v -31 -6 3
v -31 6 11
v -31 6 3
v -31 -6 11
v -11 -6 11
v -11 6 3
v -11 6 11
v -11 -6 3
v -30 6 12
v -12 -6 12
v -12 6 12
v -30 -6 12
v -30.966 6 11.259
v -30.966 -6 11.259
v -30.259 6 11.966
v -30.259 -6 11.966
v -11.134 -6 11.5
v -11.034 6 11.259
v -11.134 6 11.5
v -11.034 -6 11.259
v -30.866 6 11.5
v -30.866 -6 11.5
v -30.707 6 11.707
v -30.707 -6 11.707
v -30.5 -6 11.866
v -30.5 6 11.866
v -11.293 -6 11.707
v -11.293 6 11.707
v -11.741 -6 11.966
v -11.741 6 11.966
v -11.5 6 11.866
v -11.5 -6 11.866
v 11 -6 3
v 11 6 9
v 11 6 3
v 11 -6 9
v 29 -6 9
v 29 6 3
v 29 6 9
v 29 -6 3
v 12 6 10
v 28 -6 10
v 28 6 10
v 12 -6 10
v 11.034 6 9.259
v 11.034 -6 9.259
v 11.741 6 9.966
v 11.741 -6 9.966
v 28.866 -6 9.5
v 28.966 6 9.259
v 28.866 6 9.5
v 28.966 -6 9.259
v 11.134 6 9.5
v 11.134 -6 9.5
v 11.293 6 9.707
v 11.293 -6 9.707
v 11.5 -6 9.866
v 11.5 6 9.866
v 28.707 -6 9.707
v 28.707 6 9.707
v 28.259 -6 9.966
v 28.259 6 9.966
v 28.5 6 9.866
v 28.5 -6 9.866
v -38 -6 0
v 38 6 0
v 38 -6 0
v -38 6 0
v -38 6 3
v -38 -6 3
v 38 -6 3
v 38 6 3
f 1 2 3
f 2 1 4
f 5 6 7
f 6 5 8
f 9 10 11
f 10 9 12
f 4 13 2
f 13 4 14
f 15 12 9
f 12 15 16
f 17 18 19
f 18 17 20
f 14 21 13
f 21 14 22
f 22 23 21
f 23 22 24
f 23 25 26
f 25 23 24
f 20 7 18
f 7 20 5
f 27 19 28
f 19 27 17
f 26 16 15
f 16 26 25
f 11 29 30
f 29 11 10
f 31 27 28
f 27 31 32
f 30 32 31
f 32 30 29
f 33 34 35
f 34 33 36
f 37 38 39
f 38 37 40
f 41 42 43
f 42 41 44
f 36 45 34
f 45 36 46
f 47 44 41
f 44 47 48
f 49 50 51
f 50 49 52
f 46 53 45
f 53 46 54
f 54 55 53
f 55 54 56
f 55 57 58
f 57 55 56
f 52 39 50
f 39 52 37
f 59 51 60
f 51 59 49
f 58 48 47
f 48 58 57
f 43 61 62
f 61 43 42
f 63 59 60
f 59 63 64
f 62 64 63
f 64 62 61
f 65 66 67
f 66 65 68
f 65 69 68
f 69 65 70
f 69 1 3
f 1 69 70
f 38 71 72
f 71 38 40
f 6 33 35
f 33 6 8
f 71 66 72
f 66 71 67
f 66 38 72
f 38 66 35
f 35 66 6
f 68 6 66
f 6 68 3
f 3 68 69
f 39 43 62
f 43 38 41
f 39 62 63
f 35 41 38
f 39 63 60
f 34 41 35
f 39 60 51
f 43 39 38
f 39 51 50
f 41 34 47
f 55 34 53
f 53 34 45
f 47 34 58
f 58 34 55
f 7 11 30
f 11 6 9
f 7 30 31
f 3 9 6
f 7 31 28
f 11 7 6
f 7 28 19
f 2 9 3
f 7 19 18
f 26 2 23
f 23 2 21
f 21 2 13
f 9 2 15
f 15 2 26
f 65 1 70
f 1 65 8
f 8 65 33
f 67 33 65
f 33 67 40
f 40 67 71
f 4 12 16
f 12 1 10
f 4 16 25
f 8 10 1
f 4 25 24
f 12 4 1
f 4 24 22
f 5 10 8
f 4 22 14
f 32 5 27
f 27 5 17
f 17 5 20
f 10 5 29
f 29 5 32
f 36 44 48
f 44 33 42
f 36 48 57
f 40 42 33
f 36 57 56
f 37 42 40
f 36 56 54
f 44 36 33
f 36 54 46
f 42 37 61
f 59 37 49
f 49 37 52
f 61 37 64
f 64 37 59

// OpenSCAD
// file: lift-off-hinge-taping-rests.scad
// One loose fixed-profile rest; print TWO identical rests separately.
// Millimeters. These elevations and contact sizes are UNMEASURED EXAMPLES.
// x crosses the seam, y follows it, z=0 is the flat bench/print-bed plane.
part = "rest"; // "rest" or "contact_coupon"

base_width = 76;
base_length = 50;
base_thickness = 3;
minimum_floor_thickness = 2; // Geometric floor guard, not a strength rating.
base_edge_radius = 2;
left_land_width = 20;
right_land_width = 18;
left_land_length = 44;
right_land_length = 40;
left_land_elevation = 12;  // Absolute upper contact plane above the bench.
right_land_elevation = 10;
seam_relief_width = 22;   // Clear distance between the two land envelopes.
contact_edge_radius = 1;
placement_margin = 3;    // Minimum base margin outside each land envelope.
tape_access_width = 16;  // Declared centered access envelope, not hinge gap.
tape_access_clearance = 2; // Lateral clearance on each side of that envelope.
access_height = 5;       // Declared clear height above floor to lower land top.
coupon_length = 12;      // Short y slice through exactly the same rest source.

// Fixed modest tessellation preserves cardinal extrema and broad flat tops.
$fn = 24;

assert(part == "rest" || part == "contact_coupon",
       "Part must be rest or contact_coupon.");
assert(base_width > 0 && base_length > 0 && base_thickness > 0,
       "Base dimensions must be positive.");
assert(minimum_floor_thickness > 0 && base_thickness >= minimum_floor_thickness,
       "Base must retain the positive minimum floor thickness.");
assert(left_land_width > 0 && right_land_width > 0 &&
       left_land_length > 0 && right_land_length > 0,
       "Land dimensions must be positive.");
assert(contact_edge_radius > 0 && base_edge_radius > 0,
       "Edge radii must be positive.");
assert(2 * base_edge_radius < min(base_width, base_length),
       "Base rounding must leave straight base edges.");
assert(2 * contact_edge_radius < min(left_land_width, right_land_width,
                                   left_land_length, right_land_length),
       "Contact rounding must leave broad flat land tops.");
assert(base_thickness > contact_edge_radius,
       "Contact rounding must join each land above the base underside.");
assert(left_land_elevation >= base_thickness + 2 * contact_edge_radius &&
       right_land_elevation >= base_thickness + 2 * contact_edge_radius,
       "Land elevations must retain rounded support above the floor.");
assert(seam_relief_width > 0 && placement_margin > 0,
       "Seam relief and placement margin must be positive.");
assert(placement_margin >= base_edge_radius,
       "Placement margin must cover the rounded base corners.");
assert(seam_relief_width / 2 + left_land_width + placement_margin <= base_width / 2 &&
       seam_relief_width / 2 + right_land_width + placement_margin <= base_width / 2 &&
       max(left_land_length, right_land_length) + 2 * placement_margin <= base_length,
       "Each land must fit inside the base placement margins.");
assert(tape_access_width > 0 && tape_access_clearance > 0 && access_height > 0,
       "Tape access dimensions and clearance must be positive.");
assert(seam_relief_width >= tape_access_width + 2 * tape_access_clearance,
       "Seam relief must clear the centered tape access envelope.");
assert(min(left_land_elevation, right_land_elevation) - base_thickness >= access_height,
       "Land elevations must clear the declared access height above the floor.");
assert(coupon_length > 2 * contact_edge_radius &&
       coupon_length < min(left_land_length, right_land_length) - 2 * contact_edge_radius,
       "Coupon length must retain a short central contact cross-section.");

module rounded_base() {
    linear_extrude(height = base_thickness)
        rounded_rectangle(base_width, base_length, base_edge_radius);
}

module rounded_rectangle(width, height, radius) {
    offset(r = radius)
        square([width - 2 * radius, height - 2 * radius], center = true);
}

// Three rounded 2D extrusions soften all contact edges, including y ends.
// Their planar tops retain the exact elevation instead of a sphere's faceted
// polar approximation. The lower edge overlaps the base by one radius.
module bearing_land(x_min, width, length, elevation) {
    r = contact_edge_radius;
    bottom = base_thickness - r;
    height = elevation - bottom;
    translate([x_min + width / 2, 0, bottom + height / 2])
        intersection() {
            linear_extrude(height = height, center = true)
                rounded_rectangle(width, length, r);
            rotate([90, 0, 0])
                linear_extrude(height = length, center = true)
                    rounded_rectangle(width, height, r);
            rotate([90, 0, 90])
                linear_extrude(height = width, center = true)
                    rounded_rectangle(length, height, r);
        }
}

module rest() {
    union() {
        rounded_base();
        bearing_land(-seam_relief_width / 2 - left_land_width,
                     left_land_width, left_land_length, left_land_elevation);
        bearing_land(seam_relief_width / 2,
                     right_land_width, right_land_length, right_land_elevation);
    }
}

if (part == "rest") {
    rest();
} else {
    // Intersect the same complete solid; the sample's cut ends are flat.
    intersection() {
        rest();
        translate([-base_width / 2, -coupon_length / 2, 0])
            cube([base_width, coupon_length,
                  max(left_land_elevation, right_land_elevation)]);
    }
}
// main file
// Same-source central contact cross-section. Dimensions are millimeters.
include <lift-off-hinge-taping-rests.scad>
part = "contact_coupon";
